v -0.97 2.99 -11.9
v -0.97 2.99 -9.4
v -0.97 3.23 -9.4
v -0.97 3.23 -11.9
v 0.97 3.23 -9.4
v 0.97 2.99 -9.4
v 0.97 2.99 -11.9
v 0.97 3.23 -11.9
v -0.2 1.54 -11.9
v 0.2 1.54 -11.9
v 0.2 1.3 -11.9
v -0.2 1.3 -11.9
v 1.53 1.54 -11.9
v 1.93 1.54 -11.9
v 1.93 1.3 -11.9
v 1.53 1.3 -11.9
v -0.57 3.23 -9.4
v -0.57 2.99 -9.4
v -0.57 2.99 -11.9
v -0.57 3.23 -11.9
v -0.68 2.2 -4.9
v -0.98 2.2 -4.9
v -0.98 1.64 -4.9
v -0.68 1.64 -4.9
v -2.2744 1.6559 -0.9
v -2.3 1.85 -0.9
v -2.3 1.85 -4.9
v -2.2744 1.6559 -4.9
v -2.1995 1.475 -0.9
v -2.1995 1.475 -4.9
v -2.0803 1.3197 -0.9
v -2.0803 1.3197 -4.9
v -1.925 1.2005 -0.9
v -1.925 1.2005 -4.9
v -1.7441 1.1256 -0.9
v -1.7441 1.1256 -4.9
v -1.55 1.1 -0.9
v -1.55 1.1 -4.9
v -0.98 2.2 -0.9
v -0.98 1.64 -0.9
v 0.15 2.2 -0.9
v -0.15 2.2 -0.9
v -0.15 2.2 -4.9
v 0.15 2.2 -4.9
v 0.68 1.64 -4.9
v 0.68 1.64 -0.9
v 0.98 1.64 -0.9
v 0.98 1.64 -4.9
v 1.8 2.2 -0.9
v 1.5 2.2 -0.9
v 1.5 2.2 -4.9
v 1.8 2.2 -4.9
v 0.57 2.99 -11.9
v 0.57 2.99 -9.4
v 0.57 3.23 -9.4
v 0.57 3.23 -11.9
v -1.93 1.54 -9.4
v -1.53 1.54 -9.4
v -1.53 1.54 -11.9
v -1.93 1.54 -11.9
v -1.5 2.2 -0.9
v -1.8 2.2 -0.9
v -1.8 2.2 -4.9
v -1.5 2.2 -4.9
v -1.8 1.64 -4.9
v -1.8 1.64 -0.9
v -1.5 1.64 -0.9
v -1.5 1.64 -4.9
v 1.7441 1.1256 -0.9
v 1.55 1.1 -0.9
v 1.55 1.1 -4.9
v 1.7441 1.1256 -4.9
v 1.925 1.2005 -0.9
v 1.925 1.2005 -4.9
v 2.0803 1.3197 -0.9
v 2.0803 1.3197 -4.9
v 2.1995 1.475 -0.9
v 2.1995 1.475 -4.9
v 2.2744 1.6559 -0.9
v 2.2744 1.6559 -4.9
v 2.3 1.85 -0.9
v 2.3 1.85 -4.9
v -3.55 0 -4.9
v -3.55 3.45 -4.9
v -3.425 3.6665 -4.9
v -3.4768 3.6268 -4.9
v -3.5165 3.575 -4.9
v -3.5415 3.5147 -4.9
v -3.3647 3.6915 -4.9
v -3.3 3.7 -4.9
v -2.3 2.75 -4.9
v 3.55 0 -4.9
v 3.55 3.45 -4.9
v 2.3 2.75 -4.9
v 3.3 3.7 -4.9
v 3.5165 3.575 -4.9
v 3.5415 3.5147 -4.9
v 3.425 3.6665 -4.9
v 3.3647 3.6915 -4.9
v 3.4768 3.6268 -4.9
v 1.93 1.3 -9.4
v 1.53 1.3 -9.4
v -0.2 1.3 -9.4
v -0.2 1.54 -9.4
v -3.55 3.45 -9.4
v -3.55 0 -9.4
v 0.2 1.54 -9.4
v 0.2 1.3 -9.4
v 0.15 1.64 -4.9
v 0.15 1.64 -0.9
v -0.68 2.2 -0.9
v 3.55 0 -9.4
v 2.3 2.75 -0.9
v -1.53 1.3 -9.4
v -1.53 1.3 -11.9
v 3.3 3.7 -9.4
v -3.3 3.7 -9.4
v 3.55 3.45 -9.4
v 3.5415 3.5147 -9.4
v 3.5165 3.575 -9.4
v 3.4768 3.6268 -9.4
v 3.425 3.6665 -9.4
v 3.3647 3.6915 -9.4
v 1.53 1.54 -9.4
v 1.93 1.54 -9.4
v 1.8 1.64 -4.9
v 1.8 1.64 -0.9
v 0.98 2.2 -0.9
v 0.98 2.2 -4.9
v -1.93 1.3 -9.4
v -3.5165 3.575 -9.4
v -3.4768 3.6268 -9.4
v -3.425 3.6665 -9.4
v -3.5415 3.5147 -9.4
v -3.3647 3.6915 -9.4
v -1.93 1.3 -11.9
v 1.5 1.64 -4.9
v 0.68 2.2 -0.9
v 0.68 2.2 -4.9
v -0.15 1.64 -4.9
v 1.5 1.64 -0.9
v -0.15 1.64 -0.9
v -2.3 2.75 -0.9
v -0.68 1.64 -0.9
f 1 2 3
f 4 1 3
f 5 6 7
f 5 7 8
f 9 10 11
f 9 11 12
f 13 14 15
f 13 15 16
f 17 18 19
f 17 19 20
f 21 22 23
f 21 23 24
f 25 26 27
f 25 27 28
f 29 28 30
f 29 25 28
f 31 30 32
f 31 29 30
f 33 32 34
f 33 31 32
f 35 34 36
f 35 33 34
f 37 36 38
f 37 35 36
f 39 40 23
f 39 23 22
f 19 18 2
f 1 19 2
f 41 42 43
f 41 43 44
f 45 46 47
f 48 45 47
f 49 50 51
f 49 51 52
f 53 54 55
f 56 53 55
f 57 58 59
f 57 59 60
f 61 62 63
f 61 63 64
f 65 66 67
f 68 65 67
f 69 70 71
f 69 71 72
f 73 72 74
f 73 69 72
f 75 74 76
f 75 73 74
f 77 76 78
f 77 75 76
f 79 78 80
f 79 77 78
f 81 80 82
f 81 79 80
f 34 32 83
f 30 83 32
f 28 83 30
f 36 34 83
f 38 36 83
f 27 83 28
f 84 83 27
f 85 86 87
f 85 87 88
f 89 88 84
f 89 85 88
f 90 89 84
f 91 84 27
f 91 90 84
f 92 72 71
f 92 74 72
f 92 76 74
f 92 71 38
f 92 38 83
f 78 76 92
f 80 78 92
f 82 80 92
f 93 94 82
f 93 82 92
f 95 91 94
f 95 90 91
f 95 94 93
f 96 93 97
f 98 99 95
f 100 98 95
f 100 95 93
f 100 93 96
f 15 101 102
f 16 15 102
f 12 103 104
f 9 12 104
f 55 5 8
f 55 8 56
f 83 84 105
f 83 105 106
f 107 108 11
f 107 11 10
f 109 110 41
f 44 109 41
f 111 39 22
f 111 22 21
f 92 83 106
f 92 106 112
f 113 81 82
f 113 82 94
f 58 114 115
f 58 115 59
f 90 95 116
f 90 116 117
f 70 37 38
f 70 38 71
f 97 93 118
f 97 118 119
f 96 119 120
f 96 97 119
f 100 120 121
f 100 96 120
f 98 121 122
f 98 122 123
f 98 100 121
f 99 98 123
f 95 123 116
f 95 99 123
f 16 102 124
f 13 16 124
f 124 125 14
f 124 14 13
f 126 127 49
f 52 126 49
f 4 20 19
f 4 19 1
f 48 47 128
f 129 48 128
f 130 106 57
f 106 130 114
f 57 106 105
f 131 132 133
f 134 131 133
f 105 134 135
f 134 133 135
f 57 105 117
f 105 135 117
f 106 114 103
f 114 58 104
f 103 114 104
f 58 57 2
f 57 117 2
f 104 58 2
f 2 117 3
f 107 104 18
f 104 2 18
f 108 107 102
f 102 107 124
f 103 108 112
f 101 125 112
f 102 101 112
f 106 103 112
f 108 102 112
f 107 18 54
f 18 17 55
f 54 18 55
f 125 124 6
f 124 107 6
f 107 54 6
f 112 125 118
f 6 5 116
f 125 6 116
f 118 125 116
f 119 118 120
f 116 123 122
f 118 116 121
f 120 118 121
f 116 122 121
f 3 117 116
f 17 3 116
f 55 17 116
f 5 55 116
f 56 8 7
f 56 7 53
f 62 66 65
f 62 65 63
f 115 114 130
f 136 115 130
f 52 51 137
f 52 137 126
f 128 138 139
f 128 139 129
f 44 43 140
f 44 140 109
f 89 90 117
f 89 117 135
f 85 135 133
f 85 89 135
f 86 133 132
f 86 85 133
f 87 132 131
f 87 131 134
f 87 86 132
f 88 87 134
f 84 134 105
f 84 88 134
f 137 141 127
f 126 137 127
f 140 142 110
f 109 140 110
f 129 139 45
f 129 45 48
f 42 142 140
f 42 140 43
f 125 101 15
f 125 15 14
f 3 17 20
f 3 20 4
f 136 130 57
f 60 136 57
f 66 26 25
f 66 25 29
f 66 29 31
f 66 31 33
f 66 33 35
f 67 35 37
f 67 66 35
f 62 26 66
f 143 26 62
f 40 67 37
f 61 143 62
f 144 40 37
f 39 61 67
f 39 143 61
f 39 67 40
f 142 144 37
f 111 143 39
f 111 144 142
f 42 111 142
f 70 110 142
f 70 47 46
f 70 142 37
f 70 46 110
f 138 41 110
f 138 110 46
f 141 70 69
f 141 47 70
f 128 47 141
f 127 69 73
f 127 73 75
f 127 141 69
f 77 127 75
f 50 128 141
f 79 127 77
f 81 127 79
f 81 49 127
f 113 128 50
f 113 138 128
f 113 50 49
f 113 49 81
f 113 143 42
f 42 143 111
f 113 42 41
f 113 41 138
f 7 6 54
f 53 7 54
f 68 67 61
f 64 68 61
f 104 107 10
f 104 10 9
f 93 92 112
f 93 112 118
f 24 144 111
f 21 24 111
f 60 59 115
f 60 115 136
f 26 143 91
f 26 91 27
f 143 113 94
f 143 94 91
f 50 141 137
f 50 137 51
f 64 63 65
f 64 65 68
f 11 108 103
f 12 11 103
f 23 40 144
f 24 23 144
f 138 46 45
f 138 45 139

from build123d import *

# Parameters (mm, degrees)
BOSS_EXTRUDE1_START = -0.9
SKETCH2_W           = 0.3
SKETCH2_H           = 0.56
BOSS_EXTRUDE1_DEPTH = 4
BOSS_EXTRUDE2_DEPTH = 4.5
SKETCH4_W           = 0.4
SKETCH4_H           = 0.24
BOSS_EXTRUDE3_DEPTH = 2.5


with BuildPart() as part:
    # Sketch2 → Boss-Extrude1 (new body)
    with BuildSketch(Plane.XY.offset(BOSS_EXTRUDE1_START)):
        with BuildLine():
            Line((2.3, 2.75), (-2.3, 2.75))
            Line((-2.3, 2.75), (-2.3, 1.85))
            ThreePointArc((-2.3, 1.85), (-2.080330086, 1.319669914), (-1.55, 1.1))
            Line((-1.55, 1.1), (1.55, 1.1))
            ThreePointArc((1.55, 1.1), (2.080330086, 1.319669914), (2.3, 1.85))
            Line((2.3, 1.85), (2.3, 2.75))
        make_face()
        with Locations((-1.65, 1.92)):
            Rectangle(SKETCH2_W, SKETCH2_H, mode=Mode.SUBTRACT)
        with Locations((-0.83, 1.92)):
            Rectangle(SKETCH2_W, SKETCH2_H, mode=Mode.SUBTRACT)
        with Locations((0, 1.92)):
            Rectangle(SKETCH2_W, SKETCH2_H, mode=Mode.SUBTRACT)
        with Locations((0.83, 1.92)):
            Rectangle(SKETCH2_W, SKETCH2_H, mode=Mode.SUBTRACT)
        with Locations((1.65, 1.92)):
            Rectangle(SKETCH2_W, SKETCH2_H, mode=Mode.SUBTRACT)
    extrude(amount=-BOSS_EXTRUDE1_DEPTH)

    # Sketch3 → Boss-Extrude2 (add)
    with BuildSketch(Plane(origin=(0, 0, -4.9), x_dir=(-1, 0, 0), z_dir=(0, 0, -1))):
        with BuildLine():
            Line((-3.3, 3.7), (3.3, 3.7))
            ThreePointArc((3.3, 3.7), (3.476776695, 3.626776695), (3.55, 3.45))
            Line((3.55, 3.45), (3.55, 0))
            Line((3.55, 0), (-3.55, 0))
            Line((-3.55, 0), (-3.55, 3.45))
            ThreePointArc((-3.55, 3.45), (-3.476776695, 3.626776695), (-3.3, 3.7))
        make_face()
    extrude(amount=BOSS_EXTRUDE2_DEPTH)

    # Sketch4 → Boss-Extrude3 (add)
    with BuildSketch(Plane(origin=(0, 0, -9.4), x_dir=(-1, 0, 0), z_dir=(0, 0, -1))):
        with Locations((-0.77, 3.11)):
            Rectangle(SKETCH4_W, SKETCH4_H)
        with Locations((0.77, 3.11)):
            Rectangle(SKETCH4_W, SKETCH4_H)
        with Locations((0, 1.42)):
            Rectangle(SKETCH4_W, SKETCH4_H)
        with Locations((1.73, 1.42)):
            Rectangle(SKETCH4_W, SKETCH4_H)
        with Locations((-1.73, 1.42)):
            Rectangle(SKETCH4_W, SKETCH4_H)
    extrude(amount=BOSS_EXTRUDE3_DEPTH)


solid = part.part
